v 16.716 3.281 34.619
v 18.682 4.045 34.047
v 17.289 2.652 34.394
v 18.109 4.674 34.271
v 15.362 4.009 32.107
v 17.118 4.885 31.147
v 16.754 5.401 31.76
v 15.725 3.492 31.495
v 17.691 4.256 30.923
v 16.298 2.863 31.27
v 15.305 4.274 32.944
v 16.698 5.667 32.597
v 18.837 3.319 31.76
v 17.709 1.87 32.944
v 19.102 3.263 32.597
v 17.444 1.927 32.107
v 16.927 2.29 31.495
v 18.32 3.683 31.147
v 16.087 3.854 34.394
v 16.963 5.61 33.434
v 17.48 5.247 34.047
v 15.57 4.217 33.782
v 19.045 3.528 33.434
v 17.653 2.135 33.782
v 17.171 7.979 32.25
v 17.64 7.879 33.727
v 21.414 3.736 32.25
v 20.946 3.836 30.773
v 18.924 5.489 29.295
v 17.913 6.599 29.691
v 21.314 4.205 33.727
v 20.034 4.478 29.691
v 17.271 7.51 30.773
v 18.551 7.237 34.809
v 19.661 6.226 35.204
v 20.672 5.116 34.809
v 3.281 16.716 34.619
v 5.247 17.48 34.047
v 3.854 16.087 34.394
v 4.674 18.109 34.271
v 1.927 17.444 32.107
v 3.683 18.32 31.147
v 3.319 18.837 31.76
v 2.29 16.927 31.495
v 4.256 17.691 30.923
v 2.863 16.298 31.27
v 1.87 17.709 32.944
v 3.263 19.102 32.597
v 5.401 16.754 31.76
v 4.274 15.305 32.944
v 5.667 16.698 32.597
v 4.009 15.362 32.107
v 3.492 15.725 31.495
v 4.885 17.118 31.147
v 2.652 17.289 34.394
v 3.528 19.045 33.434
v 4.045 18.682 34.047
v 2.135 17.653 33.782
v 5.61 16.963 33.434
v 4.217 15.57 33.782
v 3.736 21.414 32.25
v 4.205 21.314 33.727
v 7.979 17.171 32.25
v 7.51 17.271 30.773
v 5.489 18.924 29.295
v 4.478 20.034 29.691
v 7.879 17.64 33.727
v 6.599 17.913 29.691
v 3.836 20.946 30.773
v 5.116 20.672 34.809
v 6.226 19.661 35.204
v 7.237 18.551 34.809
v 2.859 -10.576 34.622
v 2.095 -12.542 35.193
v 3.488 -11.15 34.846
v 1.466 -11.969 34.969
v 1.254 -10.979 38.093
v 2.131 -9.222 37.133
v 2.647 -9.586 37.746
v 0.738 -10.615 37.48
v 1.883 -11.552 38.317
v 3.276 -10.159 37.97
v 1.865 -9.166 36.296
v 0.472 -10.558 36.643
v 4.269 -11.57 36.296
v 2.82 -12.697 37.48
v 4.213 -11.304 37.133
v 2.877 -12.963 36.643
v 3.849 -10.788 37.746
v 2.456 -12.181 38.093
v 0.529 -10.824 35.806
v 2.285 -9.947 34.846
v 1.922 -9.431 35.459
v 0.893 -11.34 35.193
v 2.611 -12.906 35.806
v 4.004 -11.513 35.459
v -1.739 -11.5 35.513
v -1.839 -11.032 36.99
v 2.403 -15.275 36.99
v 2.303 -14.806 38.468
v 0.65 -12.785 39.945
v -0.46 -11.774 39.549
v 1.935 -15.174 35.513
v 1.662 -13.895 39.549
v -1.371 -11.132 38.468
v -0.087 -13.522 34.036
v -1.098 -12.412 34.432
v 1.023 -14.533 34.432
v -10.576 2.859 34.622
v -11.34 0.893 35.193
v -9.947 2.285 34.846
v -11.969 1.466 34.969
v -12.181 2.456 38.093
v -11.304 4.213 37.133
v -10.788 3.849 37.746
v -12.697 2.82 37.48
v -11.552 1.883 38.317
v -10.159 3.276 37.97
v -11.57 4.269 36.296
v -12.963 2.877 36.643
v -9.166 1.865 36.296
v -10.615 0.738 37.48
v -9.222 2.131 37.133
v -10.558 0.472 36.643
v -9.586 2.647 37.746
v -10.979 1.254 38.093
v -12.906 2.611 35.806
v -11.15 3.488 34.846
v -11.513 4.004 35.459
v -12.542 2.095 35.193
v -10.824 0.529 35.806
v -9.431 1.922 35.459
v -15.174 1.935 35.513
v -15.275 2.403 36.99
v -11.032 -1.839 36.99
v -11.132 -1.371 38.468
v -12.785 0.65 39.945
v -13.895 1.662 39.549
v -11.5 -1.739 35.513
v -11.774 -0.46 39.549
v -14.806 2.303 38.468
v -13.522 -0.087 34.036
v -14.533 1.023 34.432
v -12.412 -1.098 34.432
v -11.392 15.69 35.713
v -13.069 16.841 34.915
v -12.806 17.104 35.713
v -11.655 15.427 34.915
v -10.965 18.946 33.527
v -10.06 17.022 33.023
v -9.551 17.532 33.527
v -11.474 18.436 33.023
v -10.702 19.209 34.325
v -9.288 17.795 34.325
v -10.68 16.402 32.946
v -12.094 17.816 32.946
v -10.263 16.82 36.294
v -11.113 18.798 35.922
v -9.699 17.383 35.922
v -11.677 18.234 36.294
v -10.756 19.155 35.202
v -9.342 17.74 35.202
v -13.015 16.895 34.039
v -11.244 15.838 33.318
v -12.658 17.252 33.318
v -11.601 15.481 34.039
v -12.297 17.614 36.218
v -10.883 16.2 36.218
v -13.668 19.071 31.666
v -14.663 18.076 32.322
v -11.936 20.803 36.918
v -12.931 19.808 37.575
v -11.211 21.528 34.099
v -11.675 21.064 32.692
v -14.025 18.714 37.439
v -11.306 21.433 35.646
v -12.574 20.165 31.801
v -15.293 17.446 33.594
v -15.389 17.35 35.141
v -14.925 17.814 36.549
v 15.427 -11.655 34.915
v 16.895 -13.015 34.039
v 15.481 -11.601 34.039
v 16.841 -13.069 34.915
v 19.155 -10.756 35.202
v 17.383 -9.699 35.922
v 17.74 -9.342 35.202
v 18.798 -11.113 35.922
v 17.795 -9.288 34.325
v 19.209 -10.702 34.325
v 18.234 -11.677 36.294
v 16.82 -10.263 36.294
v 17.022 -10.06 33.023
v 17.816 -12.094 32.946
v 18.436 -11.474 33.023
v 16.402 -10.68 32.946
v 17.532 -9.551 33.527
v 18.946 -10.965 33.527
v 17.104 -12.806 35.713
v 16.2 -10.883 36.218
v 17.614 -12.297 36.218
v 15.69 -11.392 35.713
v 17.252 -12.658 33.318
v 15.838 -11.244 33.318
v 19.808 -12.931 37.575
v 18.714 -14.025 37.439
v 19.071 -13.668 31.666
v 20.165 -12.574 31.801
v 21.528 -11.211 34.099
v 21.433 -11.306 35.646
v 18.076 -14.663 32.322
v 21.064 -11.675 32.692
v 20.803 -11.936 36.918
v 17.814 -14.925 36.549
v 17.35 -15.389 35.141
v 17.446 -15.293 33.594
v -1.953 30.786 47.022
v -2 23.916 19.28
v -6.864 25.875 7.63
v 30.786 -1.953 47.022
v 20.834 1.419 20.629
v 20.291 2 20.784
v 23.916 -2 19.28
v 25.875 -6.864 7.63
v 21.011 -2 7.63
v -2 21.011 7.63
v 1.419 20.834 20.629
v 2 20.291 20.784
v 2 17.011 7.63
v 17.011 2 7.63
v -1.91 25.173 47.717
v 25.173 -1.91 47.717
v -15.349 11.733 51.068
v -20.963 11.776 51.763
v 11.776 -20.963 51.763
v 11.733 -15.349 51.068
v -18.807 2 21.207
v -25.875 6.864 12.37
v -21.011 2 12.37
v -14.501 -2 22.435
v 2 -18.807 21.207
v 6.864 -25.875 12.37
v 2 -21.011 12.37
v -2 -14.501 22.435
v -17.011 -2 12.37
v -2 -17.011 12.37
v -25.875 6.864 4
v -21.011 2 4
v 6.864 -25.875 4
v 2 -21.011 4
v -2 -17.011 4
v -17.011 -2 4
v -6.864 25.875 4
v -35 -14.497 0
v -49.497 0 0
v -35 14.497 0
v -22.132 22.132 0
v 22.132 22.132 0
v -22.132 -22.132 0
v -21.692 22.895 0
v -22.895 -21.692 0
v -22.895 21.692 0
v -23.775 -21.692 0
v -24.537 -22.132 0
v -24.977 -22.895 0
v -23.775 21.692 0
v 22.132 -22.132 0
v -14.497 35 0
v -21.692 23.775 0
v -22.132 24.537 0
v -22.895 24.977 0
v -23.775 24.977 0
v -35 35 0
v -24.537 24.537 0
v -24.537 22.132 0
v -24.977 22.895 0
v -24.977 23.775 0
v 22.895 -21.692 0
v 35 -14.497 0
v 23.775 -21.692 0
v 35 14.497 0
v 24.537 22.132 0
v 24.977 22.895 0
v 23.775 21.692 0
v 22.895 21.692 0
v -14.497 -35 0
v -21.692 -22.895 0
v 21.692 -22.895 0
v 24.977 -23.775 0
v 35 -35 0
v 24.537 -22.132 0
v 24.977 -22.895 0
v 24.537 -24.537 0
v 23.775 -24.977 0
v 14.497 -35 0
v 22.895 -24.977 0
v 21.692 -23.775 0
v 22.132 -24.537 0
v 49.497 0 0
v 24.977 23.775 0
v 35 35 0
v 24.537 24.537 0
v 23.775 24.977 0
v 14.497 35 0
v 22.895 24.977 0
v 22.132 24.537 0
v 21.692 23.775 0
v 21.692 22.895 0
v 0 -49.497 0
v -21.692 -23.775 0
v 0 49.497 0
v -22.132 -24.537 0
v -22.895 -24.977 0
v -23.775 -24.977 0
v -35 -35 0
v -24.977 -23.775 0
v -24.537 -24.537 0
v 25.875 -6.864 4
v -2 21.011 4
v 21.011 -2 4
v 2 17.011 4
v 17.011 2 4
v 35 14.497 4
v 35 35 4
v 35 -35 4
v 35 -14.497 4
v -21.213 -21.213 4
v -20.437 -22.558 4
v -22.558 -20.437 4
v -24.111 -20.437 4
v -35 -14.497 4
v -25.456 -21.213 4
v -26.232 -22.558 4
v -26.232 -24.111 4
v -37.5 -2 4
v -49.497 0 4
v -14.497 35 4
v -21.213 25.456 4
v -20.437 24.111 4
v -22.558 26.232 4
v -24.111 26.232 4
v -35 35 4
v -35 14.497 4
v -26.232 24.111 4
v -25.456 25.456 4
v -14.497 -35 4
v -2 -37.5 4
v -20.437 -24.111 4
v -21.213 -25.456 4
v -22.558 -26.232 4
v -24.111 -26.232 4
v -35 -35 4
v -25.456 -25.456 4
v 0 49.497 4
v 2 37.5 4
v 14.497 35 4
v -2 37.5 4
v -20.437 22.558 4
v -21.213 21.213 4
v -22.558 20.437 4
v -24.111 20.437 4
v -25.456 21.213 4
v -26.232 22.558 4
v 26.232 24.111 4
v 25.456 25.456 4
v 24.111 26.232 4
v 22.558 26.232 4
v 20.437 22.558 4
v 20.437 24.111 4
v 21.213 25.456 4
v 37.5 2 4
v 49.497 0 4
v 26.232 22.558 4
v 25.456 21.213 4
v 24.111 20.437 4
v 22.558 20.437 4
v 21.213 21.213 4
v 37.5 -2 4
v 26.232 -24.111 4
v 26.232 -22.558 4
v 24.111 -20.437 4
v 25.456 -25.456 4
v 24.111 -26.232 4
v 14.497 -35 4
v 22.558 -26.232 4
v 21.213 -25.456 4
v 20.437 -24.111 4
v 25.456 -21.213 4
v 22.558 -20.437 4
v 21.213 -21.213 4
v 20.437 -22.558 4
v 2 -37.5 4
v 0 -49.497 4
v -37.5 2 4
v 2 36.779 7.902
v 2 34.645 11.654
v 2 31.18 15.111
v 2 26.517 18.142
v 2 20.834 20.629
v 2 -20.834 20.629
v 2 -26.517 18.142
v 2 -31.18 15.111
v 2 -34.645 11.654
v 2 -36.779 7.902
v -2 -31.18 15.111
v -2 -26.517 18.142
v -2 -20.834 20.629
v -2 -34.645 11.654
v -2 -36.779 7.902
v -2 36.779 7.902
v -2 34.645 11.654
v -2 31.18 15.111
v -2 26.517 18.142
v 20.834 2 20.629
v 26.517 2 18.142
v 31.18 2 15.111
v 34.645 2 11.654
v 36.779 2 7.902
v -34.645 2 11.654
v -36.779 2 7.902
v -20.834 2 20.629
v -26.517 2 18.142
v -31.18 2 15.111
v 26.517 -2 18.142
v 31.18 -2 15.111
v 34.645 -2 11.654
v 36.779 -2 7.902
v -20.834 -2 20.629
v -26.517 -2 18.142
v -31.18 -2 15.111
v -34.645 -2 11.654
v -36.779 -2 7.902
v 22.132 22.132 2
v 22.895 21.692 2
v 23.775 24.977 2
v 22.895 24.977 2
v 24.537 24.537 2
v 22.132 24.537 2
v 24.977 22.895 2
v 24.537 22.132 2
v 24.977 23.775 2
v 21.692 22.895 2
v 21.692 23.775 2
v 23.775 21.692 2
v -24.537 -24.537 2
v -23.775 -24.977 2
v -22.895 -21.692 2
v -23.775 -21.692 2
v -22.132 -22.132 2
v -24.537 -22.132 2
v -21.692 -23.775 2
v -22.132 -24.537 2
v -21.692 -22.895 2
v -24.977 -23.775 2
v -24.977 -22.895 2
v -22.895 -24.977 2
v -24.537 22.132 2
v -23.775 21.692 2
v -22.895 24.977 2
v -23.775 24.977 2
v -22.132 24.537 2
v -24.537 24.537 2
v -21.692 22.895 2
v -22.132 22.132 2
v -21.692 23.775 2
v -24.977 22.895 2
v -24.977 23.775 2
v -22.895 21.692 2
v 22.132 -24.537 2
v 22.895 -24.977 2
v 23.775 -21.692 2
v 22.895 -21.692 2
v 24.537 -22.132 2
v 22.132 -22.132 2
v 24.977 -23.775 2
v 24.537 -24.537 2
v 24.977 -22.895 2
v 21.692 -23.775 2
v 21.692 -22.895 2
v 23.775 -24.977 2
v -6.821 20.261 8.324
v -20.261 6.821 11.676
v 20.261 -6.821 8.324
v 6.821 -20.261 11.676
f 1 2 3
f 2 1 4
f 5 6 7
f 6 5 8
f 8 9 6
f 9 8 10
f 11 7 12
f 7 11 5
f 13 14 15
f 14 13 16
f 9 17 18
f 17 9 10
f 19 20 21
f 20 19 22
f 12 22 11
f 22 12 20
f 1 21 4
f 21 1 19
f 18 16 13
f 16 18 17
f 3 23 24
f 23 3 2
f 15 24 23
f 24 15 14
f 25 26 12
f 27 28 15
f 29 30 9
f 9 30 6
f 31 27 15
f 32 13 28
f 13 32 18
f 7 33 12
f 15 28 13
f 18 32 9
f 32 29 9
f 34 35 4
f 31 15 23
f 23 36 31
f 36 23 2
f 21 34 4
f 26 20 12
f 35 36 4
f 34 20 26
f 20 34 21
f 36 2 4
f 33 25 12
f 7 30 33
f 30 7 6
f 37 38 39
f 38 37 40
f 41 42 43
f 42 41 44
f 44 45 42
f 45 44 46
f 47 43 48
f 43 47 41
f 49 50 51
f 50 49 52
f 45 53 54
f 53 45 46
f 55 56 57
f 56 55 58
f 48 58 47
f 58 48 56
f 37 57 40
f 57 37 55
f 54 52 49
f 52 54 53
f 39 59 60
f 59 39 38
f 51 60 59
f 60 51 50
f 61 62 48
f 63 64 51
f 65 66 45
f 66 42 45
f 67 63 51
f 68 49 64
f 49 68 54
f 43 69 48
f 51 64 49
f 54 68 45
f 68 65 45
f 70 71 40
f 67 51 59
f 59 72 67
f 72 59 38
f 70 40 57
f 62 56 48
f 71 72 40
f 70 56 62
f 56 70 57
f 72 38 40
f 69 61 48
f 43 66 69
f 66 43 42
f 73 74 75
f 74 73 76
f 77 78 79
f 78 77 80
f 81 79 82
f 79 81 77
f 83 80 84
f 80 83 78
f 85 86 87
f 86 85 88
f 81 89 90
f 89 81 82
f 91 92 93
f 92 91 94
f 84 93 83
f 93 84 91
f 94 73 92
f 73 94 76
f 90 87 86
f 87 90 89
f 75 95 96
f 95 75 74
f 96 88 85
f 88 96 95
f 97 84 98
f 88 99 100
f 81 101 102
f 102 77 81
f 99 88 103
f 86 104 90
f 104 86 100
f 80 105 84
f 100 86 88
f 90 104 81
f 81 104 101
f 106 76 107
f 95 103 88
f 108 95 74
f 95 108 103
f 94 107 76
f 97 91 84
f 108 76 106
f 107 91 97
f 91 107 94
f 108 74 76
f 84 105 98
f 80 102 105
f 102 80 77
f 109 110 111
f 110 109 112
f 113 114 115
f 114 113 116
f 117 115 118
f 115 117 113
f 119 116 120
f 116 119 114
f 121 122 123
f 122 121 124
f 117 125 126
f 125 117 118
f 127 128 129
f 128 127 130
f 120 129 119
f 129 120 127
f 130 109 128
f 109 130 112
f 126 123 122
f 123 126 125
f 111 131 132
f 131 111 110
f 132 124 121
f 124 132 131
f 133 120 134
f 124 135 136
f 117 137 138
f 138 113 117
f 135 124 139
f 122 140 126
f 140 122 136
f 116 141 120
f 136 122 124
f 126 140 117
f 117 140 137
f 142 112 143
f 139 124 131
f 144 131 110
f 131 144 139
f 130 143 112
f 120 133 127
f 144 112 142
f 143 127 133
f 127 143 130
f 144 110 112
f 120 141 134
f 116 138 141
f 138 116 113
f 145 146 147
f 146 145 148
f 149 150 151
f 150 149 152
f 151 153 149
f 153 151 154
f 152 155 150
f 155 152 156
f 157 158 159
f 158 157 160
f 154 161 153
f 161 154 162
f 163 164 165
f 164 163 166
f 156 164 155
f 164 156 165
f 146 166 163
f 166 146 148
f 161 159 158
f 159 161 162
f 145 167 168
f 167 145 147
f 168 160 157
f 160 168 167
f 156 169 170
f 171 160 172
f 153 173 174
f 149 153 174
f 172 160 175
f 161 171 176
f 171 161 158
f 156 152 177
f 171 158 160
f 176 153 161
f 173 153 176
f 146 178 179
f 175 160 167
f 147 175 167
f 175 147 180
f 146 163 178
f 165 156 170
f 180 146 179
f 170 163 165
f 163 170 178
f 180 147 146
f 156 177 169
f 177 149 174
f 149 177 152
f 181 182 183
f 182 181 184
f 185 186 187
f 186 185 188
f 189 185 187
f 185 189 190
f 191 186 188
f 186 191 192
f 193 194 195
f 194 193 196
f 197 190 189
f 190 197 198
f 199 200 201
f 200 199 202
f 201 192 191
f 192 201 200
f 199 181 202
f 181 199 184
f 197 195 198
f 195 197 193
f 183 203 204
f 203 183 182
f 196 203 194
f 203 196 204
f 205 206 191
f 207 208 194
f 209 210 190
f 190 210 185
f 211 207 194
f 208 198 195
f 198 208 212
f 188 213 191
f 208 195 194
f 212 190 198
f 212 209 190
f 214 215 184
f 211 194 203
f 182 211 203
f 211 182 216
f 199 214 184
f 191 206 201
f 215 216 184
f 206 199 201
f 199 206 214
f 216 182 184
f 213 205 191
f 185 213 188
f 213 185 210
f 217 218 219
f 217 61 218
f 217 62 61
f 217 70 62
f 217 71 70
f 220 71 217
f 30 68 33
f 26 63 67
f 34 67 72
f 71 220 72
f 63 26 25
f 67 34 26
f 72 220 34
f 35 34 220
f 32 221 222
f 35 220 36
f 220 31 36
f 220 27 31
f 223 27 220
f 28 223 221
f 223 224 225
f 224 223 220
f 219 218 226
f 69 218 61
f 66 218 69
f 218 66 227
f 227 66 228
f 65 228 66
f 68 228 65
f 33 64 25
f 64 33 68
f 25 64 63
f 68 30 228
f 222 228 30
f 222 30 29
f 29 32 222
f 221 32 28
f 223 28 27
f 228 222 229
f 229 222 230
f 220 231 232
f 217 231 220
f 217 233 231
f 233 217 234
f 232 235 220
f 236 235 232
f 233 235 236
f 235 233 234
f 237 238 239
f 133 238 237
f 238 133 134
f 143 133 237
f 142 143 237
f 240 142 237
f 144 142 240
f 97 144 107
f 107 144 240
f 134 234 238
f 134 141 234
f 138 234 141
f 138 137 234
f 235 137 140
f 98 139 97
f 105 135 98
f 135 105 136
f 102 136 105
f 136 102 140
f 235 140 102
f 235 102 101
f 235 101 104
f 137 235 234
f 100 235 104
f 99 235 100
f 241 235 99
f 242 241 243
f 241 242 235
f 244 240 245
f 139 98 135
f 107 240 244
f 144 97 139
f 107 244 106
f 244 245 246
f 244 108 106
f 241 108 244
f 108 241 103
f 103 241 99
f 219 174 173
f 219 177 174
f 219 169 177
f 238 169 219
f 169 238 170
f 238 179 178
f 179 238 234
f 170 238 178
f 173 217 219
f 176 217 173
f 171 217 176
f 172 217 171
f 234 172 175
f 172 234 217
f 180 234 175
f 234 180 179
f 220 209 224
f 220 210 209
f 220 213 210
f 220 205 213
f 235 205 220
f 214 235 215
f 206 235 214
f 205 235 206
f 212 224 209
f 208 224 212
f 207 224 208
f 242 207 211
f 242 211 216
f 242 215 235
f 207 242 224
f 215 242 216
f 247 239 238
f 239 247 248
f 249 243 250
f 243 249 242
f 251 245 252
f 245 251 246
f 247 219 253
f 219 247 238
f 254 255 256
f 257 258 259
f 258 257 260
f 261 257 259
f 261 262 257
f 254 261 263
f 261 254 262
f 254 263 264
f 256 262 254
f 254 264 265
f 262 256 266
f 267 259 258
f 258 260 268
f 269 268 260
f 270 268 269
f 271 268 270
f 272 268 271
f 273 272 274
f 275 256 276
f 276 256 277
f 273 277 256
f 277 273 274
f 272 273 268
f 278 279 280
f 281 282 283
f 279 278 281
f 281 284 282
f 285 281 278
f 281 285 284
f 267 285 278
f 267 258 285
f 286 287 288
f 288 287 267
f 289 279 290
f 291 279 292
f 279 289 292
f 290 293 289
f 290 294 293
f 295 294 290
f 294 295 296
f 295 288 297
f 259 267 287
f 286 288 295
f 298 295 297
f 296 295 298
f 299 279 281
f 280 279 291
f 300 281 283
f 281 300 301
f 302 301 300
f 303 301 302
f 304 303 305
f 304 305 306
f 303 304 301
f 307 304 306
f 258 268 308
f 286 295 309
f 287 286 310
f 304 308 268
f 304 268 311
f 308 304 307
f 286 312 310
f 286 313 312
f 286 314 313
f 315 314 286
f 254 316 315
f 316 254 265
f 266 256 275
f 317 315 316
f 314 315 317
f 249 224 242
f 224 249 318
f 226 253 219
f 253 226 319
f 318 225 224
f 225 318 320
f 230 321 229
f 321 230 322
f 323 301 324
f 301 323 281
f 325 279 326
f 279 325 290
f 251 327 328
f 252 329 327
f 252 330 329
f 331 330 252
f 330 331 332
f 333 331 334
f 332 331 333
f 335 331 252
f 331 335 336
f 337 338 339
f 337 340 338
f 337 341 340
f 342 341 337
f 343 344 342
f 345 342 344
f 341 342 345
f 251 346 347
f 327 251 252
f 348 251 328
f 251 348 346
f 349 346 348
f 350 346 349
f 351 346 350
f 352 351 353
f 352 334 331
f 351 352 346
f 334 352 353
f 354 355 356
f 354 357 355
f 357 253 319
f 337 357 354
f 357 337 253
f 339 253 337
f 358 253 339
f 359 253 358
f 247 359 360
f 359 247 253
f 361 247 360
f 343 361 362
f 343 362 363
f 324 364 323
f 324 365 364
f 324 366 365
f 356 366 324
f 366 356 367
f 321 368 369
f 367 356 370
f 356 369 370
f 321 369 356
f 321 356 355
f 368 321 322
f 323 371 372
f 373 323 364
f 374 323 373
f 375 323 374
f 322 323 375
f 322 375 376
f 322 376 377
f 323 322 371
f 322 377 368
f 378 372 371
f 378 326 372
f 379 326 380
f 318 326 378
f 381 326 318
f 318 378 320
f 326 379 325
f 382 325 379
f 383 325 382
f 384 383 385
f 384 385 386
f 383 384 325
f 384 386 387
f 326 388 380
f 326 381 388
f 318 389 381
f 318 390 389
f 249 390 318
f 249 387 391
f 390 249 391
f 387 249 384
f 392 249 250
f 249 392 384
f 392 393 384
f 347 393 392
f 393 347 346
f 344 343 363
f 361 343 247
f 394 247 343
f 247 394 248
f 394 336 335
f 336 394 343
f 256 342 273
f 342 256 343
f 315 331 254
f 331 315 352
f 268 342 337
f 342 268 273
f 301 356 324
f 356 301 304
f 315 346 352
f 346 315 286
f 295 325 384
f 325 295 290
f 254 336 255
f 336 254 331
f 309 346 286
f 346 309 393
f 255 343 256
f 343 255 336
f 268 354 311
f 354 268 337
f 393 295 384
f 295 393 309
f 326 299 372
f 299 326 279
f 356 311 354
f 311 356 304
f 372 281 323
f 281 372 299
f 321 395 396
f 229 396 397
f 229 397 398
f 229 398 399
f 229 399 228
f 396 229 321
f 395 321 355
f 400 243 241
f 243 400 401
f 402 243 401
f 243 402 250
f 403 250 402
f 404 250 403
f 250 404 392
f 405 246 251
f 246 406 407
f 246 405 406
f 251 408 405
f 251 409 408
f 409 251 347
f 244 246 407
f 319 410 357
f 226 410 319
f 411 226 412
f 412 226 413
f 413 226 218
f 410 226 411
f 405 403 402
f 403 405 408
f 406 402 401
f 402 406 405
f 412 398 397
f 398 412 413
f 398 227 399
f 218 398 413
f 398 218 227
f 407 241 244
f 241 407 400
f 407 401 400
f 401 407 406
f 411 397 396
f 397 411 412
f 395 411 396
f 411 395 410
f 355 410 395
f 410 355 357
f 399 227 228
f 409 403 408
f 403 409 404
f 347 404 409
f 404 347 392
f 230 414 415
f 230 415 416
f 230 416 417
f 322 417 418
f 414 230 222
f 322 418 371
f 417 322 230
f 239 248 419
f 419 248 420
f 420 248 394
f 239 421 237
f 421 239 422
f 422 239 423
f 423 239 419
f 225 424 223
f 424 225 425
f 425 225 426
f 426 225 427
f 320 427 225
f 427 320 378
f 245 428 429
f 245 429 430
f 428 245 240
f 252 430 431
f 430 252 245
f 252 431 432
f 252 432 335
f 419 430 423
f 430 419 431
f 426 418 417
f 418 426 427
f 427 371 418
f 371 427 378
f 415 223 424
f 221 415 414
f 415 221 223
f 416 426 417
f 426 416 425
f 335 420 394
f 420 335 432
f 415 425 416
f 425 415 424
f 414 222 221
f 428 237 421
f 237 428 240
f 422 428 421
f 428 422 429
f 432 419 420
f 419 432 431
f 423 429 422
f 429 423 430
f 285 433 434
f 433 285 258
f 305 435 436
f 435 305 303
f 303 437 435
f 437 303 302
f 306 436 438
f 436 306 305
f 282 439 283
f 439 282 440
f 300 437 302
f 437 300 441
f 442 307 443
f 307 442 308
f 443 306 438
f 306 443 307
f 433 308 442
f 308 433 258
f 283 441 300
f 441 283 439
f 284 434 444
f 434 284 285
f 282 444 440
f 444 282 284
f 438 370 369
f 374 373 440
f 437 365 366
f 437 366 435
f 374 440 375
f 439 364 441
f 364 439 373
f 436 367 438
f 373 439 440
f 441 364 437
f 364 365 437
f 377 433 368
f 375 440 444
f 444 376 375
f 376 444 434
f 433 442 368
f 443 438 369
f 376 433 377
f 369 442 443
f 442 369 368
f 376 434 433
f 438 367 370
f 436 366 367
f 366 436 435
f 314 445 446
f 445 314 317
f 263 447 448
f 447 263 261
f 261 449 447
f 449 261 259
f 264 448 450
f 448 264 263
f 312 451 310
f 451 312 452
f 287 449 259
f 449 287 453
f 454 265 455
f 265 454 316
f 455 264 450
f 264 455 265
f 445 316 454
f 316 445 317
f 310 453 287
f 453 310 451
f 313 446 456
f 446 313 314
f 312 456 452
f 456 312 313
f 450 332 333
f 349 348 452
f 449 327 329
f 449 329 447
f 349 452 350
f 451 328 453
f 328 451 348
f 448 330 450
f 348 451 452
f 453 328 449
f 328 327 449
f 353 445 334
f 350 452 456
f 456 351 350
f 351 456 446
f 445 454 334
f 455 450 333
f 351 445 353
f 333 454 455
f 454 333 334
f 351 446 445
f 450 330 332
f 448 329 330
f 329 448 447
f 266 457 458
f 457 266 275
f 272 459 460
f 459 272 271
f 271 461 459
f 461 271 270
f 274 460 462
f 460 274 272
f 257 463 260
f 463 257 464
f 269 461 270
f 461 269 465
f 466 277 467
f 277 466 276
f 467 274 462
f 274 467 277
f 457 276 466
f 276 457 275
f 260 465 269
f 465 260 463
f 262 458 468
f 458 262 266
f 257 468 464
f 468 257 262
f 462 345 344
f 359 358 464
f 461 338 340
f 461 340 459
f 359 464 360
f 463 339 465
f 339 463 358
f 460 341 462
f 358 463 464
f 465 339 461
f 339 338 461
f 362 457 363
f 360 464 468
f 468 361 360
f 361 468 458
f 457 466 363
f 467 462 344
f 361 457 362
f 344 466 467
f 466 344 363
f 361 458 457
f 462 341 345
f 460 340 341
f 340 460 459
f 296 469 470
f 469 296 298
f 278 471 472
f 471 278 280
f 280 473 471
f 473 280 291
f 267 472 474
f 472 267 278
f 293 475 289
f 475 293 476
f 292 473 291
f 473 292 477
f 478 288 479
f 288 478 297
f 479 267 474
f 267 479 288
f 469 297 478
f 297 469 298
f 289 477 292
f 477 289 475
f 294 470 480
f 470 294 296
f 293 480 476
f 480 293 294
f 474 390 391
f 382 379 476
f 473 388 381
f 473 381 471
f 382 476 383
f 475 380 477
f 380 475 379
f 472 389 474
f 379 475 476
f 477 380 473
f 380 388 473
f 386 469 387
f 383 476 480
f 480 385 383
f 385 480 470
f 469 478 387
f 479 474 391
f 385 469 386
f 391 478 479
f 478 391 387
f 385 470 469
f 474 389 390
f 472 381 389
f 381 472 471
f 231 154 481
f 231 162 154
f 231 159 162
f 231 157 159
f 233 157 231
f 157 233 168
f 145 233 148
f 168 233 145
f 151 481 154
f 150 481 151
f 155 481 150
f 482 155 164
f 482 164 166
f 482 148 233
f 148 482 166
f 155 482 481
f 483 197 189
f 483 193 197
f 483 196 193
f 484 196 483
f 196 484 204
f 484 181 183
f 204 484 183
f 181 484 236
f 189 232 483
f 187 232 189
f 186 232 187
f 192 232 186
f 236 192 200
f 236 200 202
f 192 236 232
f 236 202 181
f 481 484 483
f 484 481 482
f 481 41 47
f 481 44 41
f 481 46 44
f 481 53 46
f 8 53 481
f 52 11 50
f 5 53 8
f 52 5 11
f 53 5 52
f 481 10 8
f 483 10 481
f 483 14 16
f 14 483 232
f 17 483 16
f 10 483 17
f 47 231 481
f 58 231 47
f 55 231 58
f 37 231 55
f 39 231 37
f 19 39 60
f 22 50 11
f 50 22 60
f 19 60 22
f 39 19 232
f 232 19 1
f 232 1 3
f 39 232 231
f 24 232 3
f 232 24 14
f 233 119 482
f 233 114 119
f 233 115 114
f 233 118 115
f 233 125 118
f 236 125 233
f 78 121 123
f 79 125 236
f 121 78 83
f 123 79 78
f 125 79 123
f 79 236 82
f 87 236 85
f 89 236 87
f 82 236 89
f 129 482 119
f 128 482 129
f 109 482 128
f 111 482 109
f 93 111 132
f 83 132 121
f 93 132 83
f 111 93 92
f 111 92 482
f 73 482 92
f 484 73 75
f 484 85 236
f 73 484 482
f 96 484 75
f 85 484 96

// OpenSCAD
union() {
	difference() {
		union() {
			union() {
				union() {
					translate(v = [0, 0, 10]) {
						rotate(a = 45, v = [0, 0, 1]) {
							rotate(a = 10, v = [0, 1, 0]) {
								difference() {
									translate(v = [-13.6500000000, -23.1500000000, 0]) {
										cube(size = [27.3000000000, 46.3000000000, 40]);
									}
									union() {
										translate(v = [9.6500000000, -9.5000000000, 25]) {
											rotate(a = 90, v = [0, 1, 0]) {
												union() {
													translate(v = [0, 0, -4]) {
														cylinder($fn = 12, h = 8, r = 1.7000000000);
													}
													translate(v = [0, 0, 2]) {
														cylinder($fn = 12, h = 2, r1 = 1.7000000000, r2 = 3);
													}
												}
											}
										}
										translate(v = [9.6500000000, 9.5000000000, 25]) {
											rotate(a = 90, v = [0, 1, 0]) {
												union() {
													translate(v = [0, 0, -4]) {
														cylinder($fn = 12, h = 8, r = 1.7000000000);
													}
													translate(v = [0, 0, 2]) {
														cylinder($fn = 12, h = 2, r1 = 1.7000000000, r2 = 3);
													}
												}
											}
										}
										translate(v = [-9.6500000000, -9.5000000000, 25]) {
											rotate(a = -90, v = [0, 1, 0]) {
												union() {
													translate(v = [0, 0, -4]) {
														cylinder($fn = 12, h = 8, r = 1.7000000000);
													}
													translate(v = [0, 0, 2]) {
														cylinder($fn = 12, h = 2, r1 = 1.7000000000, r2 = 3);
													}
												}
											}
										}
										translate(v = [-9.6500000000, 9.5000000000, 25]) {
											rotate(a = -90, v = [0, 1, 0]) {
												union() {
													translate(v = [0, 0, -4]) {
														cylinder($fn = 12, h = 8, r = 1.7000000000);
													}
													translate(v = [0, 0, 2]) {
														cylinder($fn = 12, h = 2, r1 = 1.7000000000, r2 = 3);
													}
												}
											}
										}
										translate(v = [0, 19.1500000000, 25]) {
											rotate(a = -90, v = [1, 0, 0]) {
												union() {
													translate(v = [0, 0, -4]) {
														cylinder($fn = 12, h = 8, r = 1.7000000000);
													}
													translate(v = [0, 0, 2]) {
														cylinder($fn = 12, h = 2, r1 = 1.7000000000, r2 = 3);
													}
												}
											}
										}
										translate(v = [0, -19.1500000000, 25]) {
											rotate(a = 90, v = [1, 0, 0]) {
												union() {
													translate(v = [0, 0, -4]) {
														cylinder($fn = 12, h = 8, r = 1.7000000000);
													}
													translate(v = [0, 0, 2]) {
														cylinder($fn = 12, h = 2, r1 = 1.7000000000, r2 = 3);
													}
												}
											}
										}
									}
								}
							}
						}
					}
					translate(v = [0, 0, 0]) {
						rotate(a = 45, v = [0, 0, 1]) {
							translate(v = [-13.4426258286, -23.1500000000, 0]) {
								cube(size = [26.8852516572, 46.3000000000, 12.3702976252]);
							}
						}
					}
				}
				union() {
					translate(v = [-35.0000000000, -35.0000000000, 0]) {
						cube(size = [70, 70, 4]);
					}
					rotate(a = 45, v = [0, 0, 1]) {
						translate(v = [-35.0000000000, -35.0000000000, 0]) {
							cube(size = [70, 70, 4]);
						}
					}
				}
			}
			union() {
				translate(v = [0, 0, 4]) {
					intersection() {
						translate(v = [-2.0000000000, -37.5000000000, 0]) {
							cube(size = [4, 75, 20]);
						}
						rotate(a = 90, v = [0, 1, 0]) {
							translate(v = [0, 0, -2.0000000000]) {
								scale(v = [20, 37.5000000000, 1]) {
									cylinder($fn = 32, h = 4, r = 1);
								}
							}
						}
					}
				}
				translate(v = [0, 0, 4]) {
					intersection() {
						translate(v = [-37.5000000000, -2.0000000000, 0]) {
							cube(size = [75, 4, 20]);
						}
						rotate(a = 90, v = [1, 0, 0]) {
							translate(v = [0, 0, -2.0000000000]) {
								scale(v = [37.5000000000, 20, 1]) {
									cylinder($fn = 32, h = 4, r = 1);
								}
							}
						}
					}
				}
			}
		}
		union() {
			translate(v = [0, 0, 10]) {
				rotate(a = 45, v = [0, 0, 1]) {
					rotate(a = 10, v = [0, 1, 0]) {
						translate(v = [-9.6500000000, -19.1500000000, 0]) {
							cube(size = [19.3000000000, 38.3000000000, 41]);
						}
					}
				}
			}
			rotate(a = 45, v = [0, 0, 1]) {
				translate(v = [33.0000000000, 0, 0]) {
					union() {
						translate(v = [0, 0, -4]) {
							cylinder($fn = 12, h = 8, r = 1.7000000000);
						}
						translate(v = [0, 0, 2]) {
							cylinder($fn = 12, h = 2, r1 = 1.7000000000, r2 = 3);
						}
					}
				}
				translate(v = [-33.0000000000, 0, 0]) {
					union() {
						translate(v = [0, 0, -4]) {
							cylinder($fn = 12, h = 8, r = 1.7000000000);
						}
						translate(v = [0, 0, 2]) {
							cylinder($fn = 12, h = 2, r1 = 1.7000000000, r2 = 3);
						}
					}
				}
				translate(v = [0, 33.0000000000, 0]) {
					union() {
						translate(v = [0, 0, -4]) {
							cylinder($fn = 12, h = 8, r = 1.7000000000);
						}
						translate(v = [0, 0, 2]) {
							cylinder($fn = 12, h = 2, r1 = 1.7000000000, r2 = 3);
						}
					}
				}
				translate(v = [0, -33.0000000000, 0]) {
					union() {
						translate(v = [0, 0, -4]) {
							cylinder($fn = 12, h = 8, r = 1.7000000000);
						}
						translate(v = [0, 0, 2]) {
							cylinder($fn = 12, h = 2, r1 = 1.7000000000, r2 = 3);
						}
					}
				}
			}
		}
	}
}
